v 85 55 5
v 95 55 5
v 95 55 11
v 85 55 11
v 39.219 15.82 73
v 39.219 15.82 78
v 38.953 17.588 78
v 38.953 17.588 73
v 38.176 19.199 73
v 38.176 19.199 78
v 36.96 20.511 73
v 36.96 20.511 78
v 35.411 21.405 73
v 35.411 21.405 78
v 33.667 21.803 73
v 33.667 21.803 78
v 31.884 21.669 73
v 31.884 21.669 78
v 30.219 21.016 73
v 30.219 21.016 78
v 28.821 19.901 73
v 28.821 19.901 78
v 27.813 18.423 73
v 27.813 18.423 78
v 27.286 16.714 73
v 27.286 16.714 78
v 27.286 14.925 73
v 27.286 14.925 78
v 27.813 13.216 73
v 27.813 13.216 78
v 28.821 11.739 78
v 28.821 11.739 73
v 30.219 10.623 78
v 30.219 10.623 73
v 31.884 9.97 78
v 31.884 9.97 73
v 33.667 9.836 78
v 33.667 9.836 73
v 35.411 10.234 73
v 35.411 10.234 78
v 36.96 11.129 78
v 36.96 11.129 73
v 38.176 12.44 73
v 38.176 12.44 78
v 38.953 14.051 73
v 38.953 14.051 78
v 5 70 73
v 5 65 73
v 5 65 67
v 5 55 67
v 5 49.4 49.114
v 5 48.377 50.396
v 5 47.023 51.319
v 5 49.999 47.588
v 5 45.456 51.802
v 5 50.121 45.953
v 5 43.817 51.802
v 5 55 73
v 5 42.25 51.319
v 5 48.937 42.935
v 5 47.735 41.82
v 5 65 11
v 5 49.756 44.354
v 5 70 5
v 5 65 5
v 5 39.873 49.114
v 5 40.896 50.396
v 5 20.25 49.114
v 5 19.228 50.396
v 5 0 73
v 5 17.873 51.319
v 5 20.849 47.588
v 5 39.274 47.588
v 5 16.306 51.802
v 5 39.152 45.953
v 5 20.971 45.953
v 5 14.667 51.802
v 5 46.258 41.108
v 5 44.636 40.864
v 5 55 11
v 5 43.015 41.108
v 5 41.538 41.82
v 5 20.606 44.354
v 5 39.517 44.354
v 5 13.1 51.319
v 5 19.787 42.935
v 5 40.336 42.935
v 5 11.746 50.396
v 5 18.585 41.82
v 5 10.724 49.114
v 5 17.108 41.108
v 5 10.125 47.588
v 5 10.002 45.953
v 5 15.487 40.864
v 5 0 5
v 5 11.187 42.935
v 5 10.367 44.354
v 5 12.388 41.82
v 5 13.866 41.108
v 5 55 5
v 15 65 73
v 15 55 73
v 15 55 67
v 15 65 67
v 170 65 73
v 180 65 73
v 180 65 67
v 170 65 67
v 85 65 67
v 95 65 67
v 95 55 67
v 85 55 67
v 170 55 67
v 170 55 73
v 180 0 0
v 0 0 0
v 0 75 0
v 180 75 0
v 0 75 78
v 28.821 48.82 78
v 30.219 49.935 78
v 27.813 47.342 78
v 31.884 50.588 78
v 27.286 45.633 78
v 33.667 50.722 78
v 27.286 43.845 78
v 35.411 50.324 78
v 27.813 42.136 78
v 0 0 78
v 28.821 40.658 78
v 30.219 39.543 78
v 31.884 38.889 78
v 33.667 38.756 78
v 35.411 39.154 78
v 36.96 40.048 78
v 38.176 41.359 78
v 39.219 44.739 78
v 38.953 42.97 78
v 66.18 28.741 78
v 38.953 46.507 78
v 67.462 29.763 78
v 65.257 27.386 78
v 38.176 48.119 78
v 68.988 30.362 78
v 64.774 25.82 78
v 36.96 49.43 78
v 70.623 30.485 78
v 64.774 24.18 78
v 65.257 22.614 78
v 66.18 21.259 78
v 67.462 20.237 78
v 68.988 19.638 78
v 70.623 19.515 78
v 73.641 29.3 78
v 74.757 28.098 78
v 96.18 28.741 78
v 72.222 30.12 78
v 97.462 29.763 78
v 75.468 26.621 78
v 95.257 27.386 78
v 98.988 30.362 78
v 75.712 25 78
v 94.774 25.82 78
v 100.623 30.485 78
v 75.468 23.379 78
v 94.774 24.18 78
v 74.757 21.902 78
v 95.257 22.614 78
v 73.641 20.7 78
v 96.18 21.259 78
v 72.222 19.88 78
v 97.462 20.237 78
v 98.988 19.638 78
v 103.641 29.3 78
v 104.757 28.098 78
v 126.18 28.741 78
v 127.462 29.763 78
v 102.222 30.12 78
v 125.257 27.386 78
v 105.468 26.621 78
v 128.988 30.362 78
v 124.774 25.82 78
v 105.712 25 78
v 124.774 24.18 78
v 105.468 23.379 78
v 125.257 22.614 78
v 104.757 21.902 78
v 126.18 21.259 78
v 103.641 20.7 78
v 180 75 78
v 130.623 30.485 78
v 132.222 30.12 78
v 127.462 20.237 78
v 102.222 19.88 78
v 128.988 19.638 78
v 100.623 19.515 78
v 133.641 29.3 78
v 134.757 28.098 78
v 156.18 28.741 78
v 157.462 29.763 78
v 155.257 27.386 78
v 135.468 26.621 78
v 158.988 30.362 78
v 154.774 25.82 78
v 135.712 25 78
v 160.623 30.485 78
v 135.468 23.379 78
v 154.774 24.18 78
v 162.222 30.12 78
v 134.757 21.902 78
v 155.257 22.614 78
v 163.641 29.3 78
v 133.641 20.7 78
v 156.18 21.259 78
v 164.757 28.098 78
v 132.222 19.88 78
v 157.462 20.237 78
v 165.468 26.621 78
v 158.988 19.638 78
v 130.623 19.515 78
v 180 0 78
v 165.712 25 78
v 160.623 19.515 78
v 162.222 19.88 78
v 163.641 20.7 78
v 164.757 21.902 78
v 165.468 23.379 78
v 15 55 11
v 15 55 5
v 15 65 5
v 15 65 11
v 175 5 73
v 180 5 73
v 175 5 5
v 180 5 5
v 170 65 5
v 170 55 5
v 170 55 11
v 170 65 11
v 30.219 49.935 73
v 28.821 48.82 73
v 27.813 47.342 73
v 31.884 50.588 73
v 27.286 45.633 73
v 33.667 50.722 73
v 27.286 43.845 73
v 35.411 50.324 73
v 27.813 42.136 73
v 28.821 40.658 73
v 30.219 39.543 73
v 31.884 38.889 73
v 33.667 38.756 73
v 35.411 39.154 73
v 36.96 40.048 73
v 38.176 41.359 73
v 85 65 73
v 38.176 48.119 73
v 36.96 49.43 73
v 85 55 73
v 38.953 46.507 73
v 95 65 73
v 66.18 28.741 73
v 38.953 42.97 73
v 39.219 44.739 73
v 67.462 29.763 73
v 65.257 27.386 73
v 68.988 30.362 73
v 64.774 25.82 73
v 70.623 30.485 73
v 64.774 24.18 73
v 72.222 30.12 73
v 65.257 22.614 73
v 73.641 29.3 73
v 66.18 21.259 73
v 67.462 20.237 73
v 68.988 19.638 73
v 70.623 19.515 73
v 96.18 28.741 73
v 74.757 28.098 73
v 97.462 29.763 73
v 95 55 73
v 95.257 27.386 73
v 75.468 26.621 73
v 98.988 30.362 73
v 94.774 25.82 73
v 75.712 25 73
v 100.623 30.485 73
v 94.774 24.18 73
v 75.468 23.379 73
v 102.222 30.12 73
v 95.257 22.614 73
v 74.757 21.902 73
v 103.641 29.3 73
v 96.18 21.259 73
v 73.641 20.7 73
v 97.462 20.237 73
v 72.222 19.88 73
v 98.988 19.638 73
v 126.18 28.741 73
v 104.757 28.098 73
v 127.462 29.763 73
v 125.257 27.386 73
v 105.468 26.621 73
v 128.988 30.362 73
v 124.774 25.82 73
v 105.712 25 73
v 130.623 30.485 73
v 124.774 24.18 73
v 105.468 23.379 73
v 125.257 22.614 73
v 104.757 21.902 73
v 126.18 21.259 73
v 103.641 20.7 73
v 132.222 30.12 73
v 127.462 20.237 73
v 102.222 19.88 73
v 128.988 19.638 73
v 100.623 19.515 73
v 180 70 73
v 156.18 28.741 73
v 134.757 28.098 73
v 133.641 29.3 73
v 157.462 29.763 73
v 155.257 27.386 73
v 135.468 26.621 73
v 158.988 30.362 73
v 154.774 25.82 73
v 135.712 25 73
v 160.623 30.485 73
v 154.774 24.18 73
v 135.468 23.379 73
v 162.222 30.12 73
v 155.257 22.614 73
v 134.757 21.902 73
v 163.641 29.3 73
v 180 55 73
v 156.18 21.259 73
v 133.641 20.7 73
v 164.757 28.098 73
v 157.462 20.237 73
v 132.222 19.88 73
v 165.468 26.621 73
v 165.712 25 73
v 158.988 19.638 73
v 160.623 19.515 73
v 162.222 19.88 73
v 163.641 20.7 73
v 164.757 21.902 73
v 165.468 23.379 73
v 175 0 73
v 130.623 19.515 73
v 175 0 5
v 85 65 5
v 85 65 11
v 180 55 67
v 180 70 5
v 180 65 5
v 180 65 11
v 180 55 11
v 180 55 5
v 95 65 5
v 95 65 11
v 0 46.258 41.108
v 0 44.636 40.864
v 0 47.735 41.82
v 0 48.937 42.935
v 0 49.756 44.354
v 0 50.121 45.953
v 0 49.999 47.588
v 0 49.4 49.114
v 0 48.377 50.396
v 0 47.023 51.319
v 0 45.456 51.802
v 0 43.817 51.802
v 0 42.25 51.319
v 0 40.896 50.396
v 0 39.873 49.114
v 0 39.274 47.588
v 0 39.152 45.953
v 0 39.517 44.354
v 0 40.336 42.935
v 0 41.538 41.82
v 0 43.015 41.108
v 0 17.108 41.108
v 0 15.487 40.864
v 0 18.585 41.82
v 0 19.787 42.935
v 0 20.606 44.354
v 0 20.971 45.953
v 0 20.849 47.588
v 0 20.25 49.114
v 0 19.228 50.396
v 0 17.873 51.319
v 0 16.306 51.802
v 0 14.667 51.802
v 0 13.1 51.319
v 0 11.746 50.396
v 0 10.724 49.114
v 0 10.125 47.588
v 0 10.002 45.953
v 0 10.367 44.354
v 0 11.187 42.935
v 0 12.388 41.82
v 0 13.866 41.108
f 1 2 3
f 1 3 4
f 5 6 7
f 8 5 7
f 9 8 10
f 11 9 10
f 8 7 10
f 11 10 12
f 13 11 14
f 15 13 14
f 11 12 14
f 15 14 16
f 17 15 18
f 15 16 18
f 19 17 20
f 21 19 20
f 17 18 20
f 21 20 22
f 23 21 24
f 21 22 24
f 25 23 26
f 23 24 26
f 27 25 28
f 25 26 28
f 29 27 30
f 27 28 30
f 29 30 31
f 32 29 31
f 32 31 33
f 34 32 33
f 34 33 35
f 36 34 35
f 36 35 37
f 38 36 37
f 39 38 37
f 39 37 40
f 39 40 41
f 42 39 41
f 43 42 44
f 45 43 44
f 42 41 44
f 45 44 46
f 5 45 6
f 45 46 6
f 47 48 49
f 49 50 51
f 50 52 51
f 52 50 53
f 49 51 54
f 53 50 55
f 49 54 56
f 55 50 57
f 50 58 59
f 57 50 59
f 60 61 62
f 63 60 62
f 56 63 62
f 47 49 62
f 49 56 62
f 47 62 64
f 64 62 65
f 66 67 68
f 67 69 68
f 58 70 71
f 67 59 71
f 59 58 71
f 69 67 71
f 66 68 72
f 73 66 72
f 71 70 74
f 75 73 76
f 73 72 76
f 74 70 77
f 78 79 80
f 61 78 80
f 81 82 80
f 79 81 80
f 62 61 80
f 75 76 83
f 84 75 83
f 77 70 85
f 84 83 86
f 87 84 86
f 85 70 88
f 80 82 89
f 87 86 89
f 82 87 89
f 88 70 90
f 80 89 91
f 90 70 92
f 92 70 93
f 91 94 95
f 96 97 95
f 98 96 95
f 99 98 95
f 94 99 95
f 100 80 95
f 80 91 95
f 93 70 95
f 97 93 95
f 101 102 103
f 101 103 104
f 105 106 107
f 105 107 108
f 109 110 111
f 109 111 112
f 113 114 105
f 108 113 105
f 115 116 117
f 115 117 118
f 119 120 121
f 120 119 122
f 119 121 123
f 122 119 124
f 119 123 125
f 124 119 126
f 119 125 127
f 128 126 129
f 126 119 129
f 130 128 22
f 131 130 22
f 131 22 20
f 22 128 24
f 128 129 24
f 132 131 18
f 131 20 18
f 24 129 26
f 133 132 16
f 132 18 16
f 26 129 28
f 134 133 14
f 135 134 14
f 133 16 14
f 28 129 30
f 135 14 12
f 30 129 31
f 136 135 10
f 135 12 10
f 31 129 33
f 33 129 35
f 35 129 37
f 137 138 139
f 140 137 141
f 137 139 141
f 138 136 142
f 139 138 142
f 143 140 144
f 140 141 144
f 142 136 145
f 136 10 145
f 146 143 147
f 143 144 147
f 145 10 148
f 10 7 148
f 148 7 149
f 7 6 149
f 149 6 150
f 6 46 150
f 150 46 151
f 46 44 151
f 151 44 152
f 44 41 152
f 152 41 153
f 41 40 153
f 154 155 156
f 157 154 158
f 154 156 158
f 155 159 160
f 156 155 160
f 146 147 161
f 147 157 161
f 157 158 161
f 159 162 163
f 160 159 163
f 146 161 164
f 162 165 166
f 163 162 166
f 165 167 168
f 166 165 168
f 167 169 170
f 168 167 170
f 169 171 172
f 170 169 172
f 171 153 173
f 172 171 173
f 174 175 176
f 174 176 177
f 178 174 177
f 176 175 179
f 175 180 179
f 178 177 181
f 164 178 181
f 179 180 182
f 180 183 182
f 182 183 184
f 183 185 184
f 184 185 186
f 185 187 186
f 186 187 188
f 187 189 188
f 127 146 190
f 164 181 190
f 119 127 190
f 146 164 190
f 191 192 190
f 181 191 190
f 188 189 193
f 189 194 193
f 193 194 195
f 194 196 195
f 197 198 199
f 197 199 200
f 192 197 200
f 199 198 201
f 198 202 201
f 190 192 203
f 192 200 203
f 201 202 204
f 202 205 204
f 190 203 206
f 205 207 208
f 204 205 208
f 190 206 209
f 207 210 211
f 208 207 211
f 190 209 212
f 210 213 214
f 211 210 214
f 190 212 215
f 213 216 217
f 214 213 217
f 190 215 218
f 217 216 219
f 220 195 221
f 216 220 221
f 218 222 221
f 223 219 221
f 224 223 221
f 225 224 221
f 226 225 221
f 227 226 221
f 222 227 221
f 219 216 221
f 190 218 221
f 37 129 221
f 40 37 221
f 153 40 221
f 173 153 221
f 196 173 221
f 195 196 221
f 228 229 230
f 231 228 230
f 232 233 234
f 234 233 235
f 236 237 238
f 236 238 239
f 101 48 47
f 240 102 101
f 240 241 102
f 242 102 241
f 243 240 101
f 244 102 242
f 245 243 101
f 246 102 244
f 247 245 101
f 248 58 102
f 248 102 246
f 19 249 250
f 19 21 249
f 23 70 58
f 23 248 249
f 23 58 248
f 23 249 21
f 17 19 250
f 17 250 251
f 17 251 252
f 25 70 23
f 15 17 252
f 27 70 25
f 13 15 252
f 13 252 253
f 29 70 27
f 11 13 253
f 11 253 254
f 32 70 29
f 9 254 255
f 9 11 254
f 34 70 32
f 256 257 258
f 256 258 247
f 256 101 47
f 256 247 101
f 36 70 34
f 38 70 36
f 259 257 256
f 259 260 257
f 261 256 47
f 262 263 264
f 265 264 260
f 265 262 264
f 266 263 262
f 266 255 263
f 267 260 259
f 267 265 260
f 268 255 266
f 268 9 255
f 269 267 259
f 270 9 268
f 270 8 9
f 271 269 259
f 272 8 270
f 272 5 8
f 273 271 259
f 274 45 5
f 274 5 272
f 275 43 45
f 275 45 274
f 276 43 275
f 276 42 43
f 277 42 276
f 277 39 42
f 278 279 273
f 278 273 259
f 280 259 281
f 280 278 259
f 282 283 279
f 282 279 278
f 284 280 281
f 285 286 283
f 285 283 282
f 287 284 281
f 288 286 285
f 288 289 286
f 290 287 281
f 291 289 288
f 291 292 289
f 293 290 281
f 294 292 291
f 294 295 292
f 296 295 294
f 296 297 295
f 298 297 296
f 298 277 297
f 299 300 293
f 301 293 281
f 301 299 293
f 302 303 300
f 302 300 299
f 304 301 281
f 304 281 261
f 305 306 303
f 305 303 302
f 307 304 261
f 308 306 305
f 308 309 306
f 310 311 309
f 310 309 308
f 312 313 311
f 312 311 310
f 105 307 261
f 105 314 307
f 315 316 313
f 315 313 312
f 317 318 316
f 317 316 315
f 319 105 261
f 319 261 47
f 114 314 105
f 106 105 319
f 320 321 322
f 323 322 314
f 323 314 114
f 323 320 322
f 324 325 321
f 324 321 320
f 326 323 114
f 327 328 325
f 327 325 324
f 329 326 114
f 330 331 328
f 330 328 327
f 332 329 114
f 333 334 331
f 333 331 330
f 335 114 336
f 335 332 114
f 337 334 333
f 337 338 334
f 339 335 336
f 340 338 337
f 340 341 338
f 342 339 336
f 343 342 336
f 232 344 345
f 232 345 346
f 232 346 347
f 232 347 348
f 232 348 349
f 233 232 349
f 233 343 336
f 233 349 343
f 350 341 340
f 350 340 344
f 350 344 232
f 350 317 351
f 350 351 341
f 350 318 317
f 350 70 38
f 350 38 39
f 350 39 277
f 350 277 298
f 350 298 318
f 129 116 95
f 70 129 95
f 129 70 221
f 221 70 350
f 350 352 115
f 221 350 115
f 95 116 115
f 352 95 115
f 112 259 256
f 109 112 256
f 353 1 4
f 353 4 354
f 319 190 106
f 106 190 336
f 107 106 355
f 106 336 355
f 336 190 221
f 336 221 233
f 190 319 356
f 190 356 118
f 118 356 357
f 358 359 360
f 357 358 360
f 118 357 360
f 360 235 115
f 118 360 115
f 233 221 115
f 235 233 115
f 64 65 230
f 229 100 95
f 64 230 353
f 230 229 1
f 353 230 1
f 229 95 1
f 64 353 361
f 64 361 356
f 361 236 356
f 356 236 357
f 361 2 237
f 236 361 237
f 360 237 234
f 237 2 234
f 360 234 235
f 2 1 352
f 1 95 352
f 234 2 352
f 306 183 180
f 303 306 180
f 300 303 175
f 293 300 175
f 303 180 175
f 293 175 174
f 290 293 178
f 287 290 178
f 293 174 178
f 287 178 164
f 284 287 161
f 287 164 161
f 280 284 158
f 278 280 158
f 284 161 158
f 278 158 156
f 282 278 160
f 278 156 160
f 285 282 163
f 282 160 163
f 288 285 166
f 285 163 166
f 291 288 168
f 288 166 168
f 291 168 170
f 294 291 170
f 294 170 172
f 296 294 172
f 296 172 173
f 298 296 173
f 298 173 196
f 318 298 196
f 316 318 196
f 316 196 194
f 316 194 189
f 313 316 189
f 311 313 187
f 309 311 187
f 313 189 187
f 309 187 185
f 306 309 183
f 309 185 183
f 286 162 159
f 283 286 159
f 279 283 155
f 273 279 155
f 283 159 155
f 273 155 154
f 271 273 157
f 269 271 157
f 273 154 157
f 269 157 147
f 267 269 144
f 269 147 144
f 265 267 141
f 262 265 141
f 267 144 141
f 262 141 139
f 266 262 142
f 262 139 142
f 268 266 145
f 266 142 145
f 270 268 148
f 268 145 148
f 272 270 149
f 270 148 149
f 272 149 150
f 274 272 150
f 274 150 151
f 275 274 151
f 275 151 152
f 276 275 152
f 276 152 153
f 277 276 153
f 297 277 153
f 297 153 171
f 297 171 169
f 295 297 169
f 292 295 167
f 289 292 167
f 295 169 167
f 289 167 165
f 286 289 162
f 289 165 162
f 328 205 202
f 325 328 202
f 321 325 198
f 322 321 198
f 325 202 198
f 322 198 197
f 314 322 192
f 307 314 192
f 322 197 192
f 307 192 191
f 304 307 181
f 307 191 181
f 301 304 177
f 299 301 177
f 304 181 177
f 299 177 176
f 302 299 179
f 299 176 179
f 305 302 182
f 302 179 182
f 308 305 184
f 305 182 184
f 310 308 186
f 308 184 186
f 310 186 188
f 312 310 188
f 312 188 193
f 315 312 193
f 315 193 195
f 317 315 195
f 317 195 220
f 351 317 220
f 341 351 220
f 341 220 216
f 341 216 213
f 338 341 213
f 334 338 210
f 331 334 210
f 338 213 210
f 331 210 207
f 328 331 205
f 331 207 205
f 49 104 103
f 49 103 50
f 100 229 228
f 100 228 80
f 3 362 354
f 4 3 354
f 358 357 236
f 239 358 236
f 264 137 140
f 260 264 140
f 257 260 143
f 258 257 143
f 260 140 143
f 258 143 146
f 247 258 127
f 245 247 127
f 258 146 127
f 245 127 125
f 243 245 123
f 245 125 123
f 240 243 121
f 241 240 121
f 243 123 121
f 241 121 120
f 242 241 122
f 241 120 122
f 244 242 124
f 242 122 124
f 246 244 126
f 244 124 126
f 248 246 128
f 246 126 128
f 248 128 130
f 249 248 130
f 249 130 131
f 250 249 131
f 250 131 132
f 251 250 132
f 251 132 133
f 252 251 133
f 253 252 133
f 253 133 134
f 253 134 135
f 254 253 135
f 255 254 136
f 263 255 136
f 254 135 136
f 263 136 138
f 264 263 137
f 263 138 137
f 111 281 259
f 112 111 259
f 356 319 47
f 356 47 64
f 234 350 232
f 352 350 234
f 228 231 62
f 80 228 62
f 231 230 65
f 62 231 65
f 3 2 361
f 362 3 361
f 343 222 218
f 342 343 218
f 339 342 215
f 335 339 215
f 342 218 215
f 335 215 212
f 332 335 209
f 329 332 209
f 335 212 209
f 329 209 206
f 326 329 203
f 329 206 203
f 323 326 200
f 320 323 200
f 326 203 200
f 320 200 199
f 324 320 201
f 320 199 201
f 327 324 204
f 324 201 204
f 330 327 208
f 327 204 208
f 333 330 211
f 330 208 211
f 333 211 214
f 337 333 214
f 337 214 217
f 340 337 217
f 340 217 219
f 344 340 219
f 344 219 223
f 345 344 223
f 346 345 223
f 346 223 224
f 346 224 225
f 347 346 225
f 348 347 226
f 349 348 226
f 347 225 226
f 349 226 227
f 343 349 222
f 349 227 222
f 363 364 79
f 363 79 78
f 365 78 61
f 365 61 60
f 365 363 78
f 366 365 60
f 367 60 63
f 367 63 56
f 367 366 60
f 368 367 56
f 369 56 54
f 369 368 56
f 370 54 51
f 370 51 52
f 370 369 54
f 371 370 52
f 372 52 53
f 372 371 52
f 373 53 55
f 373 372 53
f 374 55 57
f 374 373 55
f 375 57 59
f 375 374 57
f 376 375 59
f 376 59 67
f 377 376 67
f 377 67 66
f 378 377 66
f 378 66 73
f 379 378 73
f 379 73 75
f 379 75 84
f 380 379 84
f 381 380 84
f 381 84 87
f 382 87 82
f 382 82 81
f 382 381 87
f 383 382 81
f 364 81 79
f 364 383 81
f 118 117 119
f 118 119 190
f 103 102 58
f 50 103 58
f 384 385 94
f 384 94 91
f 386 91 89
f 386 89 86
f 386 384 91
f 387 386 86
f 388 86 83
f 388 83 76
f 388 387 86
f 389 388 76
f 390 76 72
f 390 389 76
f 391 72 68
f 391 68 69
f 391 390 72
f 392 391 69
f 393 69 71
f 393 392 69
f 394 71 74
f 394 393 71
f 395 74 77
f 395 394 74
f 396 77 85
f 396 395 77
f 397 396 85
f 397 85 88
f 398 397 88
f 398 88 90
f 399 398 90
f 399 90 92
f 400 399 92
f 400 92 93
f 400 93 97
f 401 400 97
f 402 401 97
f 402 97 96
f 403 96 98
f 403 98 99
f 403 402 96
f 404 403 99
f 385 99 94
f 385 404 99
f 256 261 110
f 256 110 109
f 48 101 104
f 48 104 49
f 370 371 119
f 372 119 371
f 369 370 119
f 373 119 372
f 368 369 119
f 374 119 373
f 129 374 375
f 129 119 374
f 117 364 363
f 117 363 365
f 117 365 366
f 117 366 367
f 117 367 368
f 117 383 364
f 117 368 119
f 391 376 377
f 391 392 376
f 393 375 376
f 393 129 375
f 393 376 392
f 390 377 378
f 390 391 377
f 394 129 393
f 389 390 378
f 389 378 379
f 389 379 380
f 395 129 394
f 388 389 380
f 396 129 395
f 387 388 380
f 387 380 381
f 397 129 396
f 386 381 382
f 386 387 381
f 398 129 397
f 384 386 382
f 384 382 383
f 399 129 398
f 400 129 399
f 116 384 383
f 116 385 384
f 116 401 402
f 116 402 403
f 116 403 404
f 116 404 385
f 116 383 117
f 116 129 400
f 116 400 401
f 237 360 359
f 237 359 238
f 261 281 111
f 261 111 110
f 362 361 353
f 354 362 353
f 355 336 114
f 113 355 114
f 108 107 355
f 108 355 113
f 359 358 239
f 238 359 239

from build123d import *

# Parameters (mm, degrees)
SKETCH1_W           = 180
SKETCH1_H           = 78
BOSS_EXTRUDE1_DEPTH = 75
SKETCH7_W           = 170
SKETCH7_H           = 68
CUT_EXTRUDE1_DEPTH  = 70
SKETCH8_W           = 68
SKETCH8_H           = 65
CUT_EXTRUDE2_DEPTH  = 5
SKETCH2_R           = 5.5
SKETCH2_R_2         = 6
CUT_EXTRUDE3_DEPTH  = 5
SKETCH6_R           = 5.5
CUT_EXTRUDE5_DEPTH  = 5
SKETCH9_W           = 10
SKETCH9_H           = 10
BOSS_EXTRUDE2_DEPTH = 6


with BuildPart() as part:
    # Sketch1 → Boss-Extrude1 (new body)
    with BuildSketch(Plane(origin=(0, 0, 0), x_dir=(1, 0, 0), z_dir=(0, 1, 0))):
        with Locations((90, -39)):
            Rectangle(SKETCH1_W, SKETCH1_H)
    extrude(amount=BOSS_EXTRUDE1_DEPTH)

    # Sketch7 → Cut-Extrude1 (cut)
    with BuildSketch(Plane(origin=(0, 0, 0), x_dir=(1, 0, 0), z_dir=(0, 1, 0))):
        with Locations((90, -39)):
            Rectangle(SKETCH7_W, SKETCH7_H)
    extrude(amount=CUT_EXTRUDE1_DEPTH, mode=Mode.SUBTRACT)

    # Sketch8 → Cut-Extrude2 (cut)
    with BuildSketch(Plane(origin=(180, 0, 0), x_dir=(0, 0, -1), z_dir=(1, 0, 0))):
        with Locations((-39, 37.5)):
            Rectangle(SKETCH8_W, SKETCH8_H)
    extrude(amount=-CUT_EXTRUDE2_DEPTH, mode=Mode.SUBTRACT)

    # Sketch2 → Cut-Extrude3 (cut)
    with BuildSketch(Plane.XY.offset(78)):
        with Locations((160.21219032, 25)):
            Circle(SKETCH2_R)
        with Locations((100.21219032, 25)):
            Circle(SKETCH2_R)
        with Locations((130.21219032, 25)):
            Circle(SKETCH2_R)
        with Locations((70.21219032, 25)):
            Circle(SKETCH2_R)
        with Locations((33.219063995, 44.738868471)):
            Circle(SKETCH2_R_2)
        with Locations((33.219063995, 15.81956505)):
            Circle(SKETCH2_R_2)
    extrude(amount=-CUT_EXTRUDE3_DEPTH, mode=Mode.SUBTRACT)

    # Sketch6 → Cut-Extrude5 (cut)
    with BuildSketch(Plane(origin=(0, 0, 0), x_dir=(0, 0, -1), z_dir=(1, 0, 0))):
        with Locations((-46.363872843, 44.63646506)):
            Circle(SKETCH6_R)
        with Locations((-46.363872843, 15.486690828)):
            Circle(SKETCH6_R)
    extrude(amount=CUT_EXTRUDE5_DEPTH, mode=Mode.SUBTRACT)

    # Sketch9 → Boss-Extrude2 (add)
    with BuildSketch(Plane(origin=(0, 0, 73), x_dir=(-1, 0, 0), z_dir=(0, 0, -1))):
        with Locations((-175, 60)):
            Rectangle(SKETCH9_W, SKETCH9_H)
        with Locations((-90, 60)):
            Rectangle(SKETCH9_W, SKETCH9_H)
        with Locations((-10, 60)):
            Rectangle(SKETCH9_W, SKETCH9_H)
    boss_extrude2 = extrude(amount=BOSS_EXTRUDE2_DEPTH)

    # Mirror1: Boss-Extrude2 across plane
    add(boss_extrude2.mirror(Plane.XY.offset(39)))


solid = part.part
